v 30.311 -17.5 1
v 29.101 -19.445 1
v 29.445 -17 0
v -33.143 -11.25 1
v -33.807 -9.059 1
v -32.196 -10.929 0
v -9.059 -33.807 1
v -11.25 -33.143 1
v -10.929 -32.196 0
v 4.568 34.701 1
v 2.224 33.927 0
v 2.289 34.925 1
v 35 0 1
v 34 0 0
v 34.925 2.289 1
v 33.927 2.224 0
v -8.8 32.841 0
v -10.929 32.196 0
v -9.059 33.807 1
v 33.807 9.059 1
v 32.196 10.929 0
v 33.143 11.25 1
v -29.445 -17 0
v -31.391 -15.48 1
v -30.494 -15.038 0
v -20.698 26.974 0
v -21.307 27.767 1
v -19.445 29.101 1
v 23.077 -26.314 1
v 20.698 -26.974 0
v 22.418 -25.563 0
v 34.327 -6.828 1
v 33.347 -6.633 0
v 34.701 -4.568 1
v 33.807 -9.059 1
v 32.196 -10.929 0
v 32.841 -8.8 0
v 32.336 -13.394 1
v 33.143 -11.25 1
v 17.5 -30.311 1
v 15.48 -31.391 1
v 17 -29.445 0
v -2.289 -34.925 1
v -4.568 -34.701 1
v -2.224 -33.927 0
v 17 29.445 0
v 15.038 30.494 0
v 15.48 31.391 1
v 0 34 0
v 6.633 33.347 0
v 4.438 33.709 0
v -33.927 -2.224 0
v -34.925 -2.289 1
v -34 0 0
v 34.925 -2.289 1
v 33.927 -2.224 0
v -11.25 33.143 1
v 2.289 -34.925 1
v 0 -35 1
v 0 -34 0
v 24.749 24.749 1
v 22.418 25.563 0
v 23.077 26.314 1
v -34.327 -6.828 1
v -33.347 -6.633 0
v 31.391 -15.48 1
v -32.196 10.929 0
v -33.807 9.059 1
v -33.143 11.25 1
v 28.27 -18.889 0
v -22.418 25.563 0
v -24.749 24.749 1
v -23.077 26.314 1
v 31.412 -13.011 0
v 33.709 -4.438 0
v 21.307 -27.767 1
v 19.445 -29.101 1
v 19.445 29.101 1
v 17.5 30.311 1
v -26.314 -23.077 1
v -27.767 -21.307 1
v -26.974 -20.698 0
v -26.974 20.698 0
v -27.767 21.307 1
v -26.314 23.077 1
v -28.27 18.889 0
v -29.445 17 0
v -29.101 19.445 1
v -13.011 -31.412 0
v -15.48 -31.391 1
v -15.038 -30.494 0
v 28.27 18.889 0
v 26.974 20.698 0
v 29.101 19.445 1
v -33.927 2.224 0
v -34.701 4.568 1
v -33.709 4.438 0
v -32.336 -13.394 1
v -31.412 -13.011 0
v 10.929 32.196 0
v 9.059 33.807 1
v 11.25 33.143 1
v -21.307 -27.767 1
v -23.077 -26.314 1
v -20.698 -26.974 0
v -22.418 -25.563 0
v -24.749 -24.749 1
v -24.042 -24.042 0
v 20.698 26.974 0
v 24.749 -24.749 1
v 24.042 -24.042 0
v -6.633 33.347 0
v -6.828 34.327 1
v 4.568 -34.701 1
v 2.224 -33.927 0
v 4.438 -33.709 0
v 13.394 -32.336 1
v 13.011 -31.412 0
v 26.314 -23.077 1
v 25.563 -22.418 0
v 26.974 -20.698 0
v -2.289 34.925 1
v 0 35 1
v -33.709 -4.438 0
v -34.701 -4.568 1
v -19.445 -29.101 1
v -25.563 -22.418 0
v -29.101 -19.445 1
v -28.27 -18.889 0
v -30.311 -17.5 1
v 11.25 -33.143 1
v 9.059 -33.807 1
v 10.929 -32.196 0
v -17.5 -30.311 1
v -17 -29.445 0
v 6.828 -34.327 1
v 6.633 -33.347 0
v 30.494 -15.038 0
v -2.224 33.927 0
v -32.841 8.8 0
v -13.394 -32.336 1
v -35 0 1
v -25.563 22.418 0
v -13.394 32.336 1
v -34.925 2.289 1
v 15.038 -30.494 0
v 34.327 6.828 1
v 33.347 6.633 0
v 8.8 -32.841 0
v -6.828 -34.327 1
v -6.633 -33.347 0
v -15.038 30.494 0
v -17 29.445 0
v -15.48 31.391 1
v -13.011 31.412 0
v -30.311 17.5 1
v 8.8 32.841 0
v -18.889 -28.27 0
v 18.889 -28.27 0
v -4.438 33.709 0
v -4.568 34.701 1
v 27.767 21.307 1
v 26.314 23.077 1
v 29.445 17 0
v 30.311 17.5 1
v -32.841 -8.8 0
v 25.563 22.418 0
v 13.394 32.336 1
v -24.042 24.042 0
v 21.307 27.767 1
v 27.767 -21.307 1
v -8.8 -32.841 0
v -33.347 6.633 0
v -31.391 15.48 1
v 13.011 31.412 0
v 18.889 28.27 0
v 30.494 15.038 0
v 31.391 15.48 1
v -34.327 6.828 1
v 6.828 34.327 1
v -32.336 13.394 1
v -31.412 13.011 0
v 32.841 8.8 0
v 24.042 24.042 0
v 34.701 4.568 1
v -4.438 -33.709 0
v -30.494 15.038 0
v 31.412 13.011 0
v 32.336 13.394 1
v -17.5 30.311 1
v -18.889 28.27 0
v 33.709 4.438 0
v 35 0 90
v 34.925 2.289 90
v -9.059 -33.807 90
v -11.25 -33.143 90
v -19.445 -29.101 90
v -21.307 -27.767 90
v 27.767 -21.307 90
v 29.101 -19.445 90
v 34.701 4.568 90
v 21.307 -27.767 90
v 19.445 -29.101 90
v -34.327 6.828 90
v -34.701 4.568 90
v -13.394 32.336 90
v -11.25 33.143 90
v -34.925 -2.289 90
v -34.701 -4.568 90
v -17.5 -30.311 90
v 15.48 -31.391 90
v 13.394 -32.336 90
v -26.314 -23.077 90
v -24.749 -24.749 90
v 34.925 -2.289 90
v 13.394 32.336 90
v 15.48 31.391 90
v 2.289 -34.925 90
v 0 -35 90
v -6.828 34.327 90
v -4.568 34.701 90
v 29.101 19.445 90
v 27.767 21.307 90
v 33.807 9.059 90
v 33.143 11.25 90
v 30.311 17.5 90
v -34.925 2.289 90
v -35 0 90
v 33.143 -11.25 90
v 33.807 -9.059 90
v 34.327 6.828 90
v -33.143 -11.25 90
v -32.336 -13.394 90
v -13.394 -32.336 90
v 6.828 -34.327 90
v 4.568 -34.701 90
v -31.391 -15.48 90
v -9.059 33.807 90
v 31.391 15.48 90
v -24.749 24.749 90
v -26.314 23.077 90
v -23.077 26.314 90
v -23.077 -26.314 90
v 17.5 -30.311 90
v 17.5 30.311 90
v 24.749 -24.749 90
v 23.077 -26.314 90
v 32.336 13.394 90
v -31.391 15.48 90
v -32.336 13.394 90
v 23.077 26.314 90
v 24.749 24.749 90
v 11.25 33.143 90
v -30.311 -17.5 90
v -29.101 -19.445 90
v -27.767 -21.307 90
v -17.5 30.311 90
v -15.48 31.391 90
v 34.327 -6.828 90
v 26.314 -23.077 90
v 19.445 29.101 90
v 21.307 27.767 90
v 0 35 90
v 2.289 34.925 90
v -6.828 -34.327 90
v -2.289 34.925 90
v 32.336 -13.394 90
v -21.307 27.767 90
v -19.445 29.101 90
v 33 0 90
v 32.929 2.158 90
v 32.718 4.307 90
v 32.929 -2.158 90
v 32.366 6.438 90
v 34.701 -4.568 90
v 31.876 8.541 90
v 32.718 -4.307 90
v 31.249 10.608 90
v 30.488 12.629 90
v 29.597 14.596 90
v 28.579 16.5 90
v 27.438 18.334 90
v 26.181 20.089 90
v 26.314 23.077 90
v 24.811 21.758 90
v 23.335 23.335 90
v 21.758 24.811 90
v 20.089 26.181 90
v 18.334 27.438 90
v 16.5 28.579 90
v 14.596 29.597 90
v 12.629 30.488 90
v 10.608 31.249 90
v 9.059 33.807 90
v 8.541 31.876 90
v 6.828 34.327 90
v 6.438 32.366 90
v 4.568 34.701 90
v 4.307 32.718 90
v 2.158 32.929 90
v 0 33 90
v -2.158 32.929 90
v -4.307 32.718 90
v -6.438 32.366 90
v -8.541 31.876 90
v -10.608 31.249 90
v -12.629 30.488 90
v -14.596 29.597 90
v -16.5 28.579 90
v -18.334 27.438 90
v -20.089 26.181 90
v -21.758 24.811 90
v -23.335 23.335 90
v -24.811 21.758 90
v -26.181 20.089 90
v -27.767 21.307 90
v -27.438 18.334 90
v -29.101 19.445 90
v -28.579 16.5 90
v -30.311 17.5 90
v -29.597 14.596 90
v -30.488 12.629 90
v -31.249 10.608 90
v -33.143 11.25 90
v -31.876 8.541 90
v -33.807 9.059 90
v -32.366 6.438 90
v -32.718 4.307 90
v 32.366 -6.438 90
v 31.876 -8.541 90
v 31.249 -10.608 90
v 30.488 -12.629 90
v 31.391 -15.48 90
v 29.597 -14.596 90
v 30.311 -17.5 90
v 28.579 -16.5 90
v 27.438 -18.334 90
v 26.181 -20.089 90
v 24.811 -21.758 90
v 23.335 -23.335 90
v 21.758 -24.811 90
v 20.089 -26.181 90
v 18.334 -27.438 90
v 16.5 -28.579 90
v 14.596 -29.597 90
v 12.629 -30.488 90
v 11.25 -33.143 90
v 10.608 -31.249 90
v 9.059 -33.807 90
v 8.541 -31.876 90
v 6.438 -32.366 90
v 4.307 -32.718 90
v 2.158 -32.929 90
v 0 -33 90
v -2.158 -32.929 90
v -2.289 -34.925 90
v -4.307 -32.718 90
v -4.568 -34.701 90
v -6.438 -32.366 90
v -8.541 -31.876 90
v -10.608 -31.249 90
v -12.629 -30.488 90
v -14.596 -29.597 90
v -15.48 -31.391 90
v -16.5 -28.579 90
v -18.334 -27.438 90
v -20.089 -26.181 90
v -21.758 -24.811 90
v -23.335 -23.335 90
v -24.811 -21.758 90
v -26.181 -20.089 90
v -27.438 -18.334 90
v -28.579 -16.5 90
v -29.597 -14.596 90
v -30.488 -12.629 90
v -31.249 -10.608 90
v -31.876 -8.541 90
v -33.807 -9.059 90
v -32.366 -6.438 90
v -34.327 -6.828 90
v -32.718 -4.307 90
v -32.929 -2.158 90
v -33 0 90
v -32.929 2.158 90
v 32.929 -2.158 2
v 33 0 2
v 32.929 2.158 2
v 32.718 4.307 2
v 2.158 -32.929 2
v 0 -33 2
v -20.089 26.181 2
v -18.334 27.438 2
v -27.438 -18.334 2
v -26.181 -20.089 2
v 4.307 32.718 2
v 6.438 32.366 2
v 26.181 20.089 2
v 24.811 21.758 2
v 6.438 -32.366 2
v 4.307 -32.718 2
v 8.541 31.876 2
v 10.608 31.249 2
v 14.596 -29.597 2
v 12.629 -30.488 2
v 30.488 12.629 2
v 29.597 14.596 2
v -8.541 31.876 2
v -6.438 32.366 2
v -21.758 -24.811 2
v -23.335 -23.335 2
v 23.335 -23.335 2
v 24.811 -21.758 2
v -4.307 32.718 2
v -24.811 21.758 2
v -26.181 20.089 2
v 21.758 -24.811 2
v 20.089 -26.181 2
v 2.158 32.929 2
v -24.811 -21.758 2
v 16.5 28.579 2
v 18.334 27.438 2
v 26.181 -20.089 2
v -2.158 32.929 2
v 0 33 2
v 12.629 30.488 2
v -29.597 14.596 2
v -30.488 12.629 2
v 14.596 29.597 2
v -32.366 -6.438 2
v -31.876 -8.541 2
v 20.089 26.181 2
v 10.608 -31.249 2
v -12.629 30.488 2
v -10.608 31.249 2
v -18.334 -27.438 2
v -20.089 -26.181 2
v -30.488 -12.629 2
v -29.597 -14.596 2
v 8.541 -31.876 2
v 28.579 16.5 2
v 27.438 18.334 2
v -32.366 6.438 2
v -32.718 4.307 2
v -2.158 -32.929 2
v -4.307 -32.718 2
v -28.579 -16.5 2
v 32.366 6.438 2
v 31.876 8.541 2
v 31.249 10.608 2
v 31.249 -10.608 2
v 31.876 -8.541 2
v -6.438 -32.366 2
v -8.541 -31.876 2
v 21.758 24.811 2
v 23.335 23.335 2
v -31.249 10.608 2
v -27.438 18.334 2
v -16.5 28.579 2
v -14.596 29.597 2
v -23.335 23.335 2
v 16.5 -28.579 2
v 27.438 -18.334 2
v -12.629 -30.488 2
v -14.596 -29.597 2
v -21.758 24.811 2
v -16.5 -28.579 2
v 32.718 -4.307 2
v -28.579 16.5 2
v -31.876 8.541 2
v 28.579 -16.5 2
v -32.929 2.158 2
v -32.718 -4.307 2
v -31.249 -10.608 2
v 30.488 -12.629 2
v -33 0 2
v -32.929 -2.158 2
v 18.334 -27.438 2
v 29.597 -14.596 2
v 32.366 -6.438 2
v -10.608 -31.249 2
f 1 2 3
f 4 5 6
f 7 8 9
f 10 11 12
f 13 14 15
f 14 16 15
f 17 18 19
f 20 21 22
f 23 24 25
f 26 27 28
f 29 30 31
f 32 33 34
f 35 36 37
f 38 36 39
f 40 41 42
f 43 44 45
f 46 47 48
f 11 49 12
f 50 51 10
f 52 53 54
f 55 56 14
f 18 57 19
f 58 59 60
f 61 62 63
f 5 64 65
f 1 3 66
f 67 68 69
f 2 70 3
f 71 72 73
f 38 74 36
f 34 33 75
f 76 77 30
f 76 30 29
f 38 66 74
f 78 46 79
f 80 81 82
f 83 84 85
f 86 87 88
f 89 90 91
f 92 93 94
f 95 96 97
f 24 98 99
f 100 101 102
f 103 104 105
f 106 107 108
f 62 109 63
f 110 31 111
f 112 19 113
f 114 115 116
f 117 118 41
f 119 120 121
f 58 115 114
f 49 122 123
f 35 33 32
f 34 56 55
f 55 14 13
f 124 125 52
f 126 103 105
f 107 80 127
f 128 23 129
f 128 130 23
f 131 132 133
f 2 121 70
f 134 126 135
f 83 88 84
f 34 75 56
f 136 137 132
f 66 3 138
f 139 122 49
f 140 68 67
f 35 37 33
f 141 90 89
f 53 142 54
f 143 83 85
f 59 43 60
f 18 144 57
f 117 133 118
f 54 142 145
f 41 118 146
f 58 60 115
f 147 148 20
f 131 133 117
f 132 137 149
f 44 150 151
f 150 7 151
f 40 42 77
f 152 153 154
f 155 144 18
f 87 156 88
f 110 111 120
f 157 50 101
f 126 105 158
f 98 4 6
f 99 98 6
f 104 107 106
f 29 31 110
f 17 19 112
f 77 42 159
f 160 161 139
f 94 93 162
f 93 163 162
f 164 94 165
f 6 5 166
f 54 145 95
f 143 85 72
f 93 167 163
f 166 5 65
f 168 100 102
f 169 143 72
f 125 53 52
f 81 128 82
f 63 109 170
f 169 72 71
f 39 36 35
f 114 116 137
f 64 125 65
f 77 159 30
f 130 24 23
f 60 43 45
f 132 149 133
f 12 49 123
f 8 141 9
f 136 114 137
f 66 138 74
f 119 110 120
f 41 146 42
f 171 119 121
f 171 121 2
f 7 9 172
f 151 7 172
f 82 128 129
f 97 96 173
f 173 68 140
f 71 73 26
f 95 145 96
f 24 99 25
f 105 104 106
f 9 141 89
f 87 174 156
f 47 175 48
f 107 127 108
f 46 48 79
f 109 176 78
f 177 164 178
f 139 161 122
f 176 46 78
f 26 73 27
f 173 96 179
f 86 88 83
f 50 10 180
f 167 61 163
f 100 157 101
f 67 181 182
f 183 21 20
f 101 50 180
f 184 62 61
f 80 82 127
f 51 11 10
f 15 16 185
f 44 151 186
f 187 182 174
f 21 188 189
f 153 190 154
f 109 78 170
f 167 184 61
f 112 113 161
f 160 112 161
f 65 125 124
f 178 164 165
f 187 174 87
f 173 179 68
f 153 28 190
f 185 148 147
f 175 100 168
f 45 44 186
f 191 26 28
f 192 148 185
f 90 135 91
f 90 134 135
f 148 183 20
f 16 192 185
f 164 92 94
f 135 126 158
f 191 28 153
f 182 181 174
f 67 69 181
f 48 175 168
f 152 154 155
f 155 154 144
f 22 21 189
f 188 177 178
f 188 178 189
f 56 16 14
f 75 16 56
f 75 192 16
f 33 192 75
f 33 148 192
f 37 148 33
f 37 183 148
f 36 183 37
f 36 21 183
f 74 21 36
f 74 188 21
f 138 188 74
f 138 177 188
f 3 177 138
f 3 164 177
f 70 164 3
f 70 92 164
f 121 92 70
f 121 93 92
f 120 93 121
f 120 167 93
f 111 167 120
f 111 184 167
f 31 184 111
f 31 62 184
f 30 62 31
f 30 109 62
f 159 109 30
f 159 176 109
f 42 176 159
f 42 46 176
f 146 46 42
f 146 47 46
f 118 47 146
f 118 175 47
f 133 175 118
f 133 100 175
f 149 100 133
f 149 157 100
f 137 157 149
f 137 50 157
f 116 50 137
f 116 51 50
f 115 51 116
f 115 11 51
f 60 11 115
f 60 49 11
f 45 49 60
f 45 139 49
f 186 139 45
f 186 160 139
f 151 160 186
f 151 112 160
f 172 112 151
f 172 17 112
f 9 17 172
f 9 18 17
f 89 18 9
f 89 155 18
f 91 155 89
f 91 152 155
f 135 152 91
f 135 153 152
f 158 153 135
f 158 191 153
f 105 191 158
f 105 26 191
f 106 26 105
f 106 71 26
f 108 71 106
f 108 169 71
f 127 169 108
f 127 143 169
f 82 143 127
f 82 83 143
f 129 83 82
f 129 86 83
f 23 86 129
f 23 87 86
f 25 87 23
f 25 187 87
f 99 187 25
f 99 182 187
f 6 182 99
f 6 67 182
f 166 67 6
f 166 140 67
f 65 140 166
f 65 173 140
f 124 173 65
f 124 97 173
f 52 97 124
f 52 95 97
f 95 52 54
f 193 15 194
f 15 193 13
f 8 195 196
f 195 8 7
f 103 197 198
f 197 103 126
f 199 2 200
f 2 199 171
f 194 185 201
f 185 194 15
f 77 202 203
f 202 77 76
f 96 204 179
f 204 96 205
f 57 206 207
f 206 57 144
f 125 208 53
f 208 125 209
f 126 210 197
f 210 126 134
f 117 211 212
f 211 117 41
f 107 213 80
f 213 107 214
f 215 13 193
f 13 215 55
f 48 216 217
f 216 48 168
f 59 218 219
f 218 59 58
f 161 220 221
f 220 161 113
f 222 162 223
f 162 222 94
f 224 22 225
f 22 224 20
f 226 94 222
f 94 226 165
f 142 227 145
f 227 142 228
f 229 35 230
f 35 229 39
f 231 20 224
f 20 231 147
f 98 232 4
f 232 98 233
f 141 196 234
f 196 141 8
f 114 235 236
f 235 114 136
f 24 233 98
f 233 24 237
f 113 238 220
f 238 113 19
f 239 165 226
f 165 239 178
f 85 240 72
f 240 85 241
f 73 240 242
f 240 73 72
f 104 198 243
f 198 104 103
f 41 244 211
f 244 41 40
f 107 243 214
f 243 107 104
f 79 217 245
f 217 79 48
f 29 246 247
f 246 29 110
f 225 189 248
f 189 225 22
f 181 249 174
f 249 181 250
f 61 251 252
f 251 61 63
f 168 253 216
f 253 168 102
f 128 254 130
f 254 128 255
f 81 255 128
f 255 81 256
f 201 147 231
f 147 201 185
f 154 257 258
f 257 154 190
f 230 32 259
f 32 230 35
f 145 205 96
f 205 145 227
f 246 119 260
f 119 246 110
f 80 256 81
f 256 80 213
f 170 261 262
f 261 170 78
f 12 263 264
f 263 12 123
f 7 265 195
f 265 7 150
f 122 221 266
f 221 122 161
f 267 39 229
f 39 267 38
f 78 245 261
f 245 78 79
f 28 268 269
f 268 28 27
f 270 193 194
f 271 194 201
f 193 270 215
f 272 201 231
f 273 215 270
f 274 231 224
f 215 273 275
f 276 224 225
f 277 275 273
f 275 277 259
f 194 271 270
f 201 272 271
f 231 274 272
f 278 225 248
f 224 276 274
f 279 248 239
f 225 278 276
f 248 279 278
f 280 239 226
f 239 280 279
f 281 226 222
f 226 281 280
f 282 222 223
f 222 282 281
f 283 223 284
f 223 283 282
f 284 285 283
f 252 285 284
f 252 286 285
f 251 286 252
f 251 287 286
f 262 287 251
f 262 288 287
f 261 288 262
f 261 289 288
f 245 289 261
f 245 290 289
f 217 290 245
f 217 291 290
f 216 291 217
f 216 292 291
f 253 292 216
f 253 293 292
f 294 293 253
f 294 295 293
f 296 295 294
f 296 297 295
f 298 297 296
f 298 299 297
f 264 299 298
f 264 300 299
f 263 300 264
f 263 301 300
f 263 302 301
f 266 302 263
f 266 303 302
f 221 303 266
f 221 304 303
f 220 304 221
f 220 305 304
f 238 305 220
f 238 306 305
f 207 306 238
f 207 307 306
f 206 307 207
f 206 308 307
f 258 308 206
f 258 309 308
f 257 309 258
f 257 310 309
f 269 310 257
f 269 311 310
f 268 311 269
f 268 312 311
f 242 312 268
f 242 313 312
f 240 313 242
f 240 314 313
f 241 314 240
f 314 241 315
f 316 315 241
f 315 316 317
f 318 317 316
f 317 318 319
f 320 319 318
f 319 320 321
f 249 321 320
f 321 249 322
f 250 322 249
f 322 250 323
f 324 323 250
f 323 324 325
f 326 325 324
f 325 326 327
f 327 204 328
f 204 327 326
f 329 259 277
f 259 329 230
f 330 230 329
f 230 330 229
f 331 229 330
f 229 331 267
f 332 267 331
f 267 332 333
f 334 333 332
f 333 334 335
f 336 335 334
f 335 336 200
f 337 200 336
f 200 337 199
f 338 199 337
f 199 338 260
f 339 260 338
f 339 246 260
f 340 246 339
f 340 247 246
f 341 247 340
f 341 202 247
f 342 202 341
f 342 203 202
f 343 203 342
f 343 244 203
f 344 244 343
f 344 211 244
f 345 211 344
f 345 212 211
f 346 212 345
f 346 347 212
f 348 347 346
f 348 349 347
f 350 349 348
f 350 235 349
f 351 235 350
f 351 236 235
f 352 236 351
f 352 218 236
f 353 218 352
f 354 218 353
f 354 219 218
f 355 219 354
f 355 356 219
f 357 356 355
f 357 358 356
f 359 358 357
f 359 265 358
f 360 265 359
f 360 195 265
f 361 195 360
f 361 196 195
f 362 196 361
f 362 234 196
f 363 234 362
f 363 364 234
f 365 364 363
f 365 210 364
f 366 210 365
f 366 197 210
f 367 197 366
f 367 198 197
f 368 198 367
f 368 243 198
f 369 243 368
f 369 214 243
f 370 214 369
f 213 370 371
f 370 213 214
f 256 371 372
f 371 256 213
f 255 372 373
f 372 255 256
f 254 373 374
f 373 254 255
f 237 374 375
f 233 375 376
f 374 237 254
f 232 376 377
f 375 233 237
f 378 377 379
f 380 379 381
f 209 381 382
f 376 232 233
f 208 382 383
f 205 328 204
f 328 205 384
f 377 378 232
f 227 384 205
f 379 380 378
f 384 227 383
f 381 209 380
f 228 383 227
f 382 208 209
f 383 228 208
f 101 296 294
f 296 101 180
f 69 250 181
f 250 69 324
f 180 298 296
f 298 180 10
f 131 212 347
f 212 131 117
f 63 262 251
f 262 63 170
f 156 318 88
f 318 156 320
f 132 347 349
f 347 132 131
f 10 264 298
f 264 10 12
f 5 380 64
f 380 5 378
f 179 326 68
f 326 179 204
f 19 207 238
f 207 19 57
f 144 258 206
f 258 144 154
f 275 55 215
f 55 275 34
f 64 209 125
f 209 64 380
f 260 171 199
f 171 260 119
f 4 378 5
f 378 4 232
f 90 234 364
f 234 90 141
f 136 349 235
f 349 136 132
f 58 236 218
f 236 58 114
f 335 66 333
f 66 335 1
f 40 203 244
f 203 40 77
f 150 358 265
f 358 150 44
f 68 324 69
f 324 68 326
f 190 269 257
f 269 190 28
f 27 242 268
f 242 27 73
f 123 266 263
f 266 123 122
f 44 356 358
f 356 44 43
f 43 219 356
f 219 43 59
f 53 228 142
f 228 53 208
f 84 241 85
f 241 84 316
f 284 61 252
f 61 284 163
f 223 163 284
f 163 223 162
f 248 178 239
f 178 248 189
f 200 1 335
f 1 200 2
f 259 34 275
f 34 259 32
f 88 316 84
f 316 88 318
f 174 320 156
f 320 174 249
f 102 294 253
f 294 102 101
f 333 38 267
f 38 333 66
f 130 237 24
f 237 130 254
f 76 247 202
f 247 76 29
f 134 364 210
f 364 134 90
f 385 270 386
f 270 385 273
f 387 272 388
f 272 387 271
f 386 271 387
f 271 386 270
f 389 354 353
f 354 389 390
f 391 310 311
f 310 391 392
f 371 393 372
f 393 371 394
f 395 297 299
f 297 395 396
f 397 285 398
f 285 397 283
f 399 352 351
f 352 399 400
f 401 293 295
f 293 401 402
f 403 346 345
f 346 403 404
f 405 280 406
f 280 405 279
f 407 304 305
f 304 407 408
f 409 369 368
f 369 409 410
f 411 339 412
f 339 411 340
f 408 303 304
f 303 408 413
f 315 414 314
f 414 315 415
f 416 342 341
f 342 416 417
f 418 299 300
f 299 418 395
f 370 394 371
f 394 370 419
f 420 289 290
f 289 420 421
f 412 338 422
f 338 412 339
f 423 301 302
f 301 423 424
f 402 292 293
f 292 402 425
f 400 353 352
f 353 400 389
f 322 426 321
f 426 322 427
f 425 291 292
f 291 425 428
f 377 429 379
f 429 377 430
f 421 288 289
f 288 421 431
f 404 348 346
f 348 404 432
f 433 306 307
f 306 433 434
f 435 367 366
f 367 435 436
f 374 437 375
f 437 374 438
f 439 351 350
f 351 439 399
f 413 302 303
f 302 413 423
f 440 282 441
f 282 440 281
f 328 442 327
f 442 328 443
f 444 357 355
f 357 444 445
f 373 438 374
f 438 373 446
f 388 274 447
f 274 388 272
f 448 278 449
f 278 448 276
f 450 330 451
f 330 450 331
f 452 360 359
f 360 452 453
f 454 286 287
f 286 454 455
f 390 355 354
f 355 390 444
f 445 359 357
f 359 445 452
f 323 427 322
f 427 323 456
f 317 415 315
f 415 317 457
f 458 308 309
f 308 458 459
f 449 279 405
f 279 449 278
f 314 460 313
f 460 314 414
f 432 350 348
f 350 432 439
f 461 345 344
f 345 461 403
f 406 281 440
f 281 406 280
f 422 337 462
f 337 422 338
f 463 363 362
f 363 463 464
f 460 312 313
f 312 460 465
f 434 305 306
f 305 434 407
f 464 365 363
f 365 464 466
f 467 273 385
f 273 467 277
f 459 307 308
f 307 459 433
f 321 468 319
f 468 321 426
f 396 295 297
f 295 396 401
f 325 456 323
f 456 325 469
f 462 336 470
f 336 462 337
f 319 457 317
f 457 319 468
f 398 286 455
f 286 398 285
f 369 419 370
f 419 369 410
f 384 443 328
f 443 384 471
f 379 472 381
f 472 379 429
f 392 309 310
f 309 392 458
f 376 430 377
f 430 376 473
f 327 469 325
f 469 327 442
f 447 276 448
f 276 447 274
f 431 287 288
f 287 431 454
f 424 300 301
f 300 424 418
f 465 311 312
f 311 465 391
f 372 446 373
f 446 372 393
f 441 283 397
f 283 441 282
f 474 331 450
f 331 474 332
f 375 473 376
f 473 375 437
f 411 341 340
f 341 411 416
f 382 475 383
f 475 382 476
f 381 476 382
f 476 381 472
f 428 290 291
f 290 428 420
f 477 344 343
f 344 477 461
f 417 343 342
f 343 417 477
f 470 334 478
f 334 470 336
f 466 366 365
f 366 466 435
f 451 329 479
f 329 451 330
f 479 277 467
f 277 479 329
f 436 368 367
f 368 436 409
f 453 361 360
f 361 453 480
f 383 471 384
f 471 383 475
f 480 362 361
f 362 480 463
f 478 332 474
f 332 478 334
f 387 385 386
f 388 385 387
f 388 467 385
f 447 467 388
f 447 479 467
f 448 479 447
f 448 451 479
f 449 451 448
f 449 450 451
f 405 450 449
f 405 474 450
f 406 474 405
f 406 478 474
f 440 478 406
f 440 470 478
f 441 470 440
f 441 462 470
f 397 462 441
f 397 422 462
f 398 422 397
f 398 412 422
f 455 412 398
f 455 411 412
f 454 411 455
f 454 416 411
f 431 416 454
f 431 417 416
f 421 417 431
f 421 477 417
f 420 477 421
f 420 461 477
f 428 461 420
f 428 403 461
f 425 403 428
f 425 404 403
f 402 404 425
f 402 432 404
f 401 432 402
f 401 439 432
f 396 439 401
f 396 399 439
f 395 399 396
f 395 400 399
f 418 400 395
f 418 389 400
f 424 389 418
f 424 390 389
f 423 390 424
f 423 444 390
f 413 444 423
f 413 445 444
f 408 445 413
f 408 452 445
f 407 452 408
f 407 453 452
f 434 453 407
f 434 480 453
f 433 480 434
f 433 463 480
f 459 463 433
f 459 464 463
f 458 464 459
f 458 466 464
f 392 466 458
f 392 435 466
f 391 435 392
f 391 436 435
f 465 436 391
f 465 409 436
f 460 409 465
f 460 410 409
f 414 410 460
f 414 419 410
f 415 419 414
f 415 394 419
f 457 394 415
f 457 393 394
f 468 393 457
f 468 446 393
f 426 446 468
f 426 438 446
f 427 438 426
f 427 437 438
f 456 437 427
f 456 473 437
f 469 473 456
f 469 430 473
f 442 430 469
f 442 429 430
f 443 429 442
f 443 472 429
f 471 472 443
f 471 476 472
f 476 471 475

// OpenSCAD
// ARTIFEX template: cup / pen holder
diameter = 70;
height = 90;
wall = 2;
floor_t = 2;
chamfer = 1;
$fn = 96;

difference() {
    union() {
        cylinder(d1 = diameter - 2 * chamfer, d2 = diameter, h = chamfer);
        translate([0, 0, chamfer]) cylinder(d = diameter, h = height - chamfer);
    }
    translate([0, 0, floor_t]) cylinder(d = diameter - 2 * wall, h = height);
}
